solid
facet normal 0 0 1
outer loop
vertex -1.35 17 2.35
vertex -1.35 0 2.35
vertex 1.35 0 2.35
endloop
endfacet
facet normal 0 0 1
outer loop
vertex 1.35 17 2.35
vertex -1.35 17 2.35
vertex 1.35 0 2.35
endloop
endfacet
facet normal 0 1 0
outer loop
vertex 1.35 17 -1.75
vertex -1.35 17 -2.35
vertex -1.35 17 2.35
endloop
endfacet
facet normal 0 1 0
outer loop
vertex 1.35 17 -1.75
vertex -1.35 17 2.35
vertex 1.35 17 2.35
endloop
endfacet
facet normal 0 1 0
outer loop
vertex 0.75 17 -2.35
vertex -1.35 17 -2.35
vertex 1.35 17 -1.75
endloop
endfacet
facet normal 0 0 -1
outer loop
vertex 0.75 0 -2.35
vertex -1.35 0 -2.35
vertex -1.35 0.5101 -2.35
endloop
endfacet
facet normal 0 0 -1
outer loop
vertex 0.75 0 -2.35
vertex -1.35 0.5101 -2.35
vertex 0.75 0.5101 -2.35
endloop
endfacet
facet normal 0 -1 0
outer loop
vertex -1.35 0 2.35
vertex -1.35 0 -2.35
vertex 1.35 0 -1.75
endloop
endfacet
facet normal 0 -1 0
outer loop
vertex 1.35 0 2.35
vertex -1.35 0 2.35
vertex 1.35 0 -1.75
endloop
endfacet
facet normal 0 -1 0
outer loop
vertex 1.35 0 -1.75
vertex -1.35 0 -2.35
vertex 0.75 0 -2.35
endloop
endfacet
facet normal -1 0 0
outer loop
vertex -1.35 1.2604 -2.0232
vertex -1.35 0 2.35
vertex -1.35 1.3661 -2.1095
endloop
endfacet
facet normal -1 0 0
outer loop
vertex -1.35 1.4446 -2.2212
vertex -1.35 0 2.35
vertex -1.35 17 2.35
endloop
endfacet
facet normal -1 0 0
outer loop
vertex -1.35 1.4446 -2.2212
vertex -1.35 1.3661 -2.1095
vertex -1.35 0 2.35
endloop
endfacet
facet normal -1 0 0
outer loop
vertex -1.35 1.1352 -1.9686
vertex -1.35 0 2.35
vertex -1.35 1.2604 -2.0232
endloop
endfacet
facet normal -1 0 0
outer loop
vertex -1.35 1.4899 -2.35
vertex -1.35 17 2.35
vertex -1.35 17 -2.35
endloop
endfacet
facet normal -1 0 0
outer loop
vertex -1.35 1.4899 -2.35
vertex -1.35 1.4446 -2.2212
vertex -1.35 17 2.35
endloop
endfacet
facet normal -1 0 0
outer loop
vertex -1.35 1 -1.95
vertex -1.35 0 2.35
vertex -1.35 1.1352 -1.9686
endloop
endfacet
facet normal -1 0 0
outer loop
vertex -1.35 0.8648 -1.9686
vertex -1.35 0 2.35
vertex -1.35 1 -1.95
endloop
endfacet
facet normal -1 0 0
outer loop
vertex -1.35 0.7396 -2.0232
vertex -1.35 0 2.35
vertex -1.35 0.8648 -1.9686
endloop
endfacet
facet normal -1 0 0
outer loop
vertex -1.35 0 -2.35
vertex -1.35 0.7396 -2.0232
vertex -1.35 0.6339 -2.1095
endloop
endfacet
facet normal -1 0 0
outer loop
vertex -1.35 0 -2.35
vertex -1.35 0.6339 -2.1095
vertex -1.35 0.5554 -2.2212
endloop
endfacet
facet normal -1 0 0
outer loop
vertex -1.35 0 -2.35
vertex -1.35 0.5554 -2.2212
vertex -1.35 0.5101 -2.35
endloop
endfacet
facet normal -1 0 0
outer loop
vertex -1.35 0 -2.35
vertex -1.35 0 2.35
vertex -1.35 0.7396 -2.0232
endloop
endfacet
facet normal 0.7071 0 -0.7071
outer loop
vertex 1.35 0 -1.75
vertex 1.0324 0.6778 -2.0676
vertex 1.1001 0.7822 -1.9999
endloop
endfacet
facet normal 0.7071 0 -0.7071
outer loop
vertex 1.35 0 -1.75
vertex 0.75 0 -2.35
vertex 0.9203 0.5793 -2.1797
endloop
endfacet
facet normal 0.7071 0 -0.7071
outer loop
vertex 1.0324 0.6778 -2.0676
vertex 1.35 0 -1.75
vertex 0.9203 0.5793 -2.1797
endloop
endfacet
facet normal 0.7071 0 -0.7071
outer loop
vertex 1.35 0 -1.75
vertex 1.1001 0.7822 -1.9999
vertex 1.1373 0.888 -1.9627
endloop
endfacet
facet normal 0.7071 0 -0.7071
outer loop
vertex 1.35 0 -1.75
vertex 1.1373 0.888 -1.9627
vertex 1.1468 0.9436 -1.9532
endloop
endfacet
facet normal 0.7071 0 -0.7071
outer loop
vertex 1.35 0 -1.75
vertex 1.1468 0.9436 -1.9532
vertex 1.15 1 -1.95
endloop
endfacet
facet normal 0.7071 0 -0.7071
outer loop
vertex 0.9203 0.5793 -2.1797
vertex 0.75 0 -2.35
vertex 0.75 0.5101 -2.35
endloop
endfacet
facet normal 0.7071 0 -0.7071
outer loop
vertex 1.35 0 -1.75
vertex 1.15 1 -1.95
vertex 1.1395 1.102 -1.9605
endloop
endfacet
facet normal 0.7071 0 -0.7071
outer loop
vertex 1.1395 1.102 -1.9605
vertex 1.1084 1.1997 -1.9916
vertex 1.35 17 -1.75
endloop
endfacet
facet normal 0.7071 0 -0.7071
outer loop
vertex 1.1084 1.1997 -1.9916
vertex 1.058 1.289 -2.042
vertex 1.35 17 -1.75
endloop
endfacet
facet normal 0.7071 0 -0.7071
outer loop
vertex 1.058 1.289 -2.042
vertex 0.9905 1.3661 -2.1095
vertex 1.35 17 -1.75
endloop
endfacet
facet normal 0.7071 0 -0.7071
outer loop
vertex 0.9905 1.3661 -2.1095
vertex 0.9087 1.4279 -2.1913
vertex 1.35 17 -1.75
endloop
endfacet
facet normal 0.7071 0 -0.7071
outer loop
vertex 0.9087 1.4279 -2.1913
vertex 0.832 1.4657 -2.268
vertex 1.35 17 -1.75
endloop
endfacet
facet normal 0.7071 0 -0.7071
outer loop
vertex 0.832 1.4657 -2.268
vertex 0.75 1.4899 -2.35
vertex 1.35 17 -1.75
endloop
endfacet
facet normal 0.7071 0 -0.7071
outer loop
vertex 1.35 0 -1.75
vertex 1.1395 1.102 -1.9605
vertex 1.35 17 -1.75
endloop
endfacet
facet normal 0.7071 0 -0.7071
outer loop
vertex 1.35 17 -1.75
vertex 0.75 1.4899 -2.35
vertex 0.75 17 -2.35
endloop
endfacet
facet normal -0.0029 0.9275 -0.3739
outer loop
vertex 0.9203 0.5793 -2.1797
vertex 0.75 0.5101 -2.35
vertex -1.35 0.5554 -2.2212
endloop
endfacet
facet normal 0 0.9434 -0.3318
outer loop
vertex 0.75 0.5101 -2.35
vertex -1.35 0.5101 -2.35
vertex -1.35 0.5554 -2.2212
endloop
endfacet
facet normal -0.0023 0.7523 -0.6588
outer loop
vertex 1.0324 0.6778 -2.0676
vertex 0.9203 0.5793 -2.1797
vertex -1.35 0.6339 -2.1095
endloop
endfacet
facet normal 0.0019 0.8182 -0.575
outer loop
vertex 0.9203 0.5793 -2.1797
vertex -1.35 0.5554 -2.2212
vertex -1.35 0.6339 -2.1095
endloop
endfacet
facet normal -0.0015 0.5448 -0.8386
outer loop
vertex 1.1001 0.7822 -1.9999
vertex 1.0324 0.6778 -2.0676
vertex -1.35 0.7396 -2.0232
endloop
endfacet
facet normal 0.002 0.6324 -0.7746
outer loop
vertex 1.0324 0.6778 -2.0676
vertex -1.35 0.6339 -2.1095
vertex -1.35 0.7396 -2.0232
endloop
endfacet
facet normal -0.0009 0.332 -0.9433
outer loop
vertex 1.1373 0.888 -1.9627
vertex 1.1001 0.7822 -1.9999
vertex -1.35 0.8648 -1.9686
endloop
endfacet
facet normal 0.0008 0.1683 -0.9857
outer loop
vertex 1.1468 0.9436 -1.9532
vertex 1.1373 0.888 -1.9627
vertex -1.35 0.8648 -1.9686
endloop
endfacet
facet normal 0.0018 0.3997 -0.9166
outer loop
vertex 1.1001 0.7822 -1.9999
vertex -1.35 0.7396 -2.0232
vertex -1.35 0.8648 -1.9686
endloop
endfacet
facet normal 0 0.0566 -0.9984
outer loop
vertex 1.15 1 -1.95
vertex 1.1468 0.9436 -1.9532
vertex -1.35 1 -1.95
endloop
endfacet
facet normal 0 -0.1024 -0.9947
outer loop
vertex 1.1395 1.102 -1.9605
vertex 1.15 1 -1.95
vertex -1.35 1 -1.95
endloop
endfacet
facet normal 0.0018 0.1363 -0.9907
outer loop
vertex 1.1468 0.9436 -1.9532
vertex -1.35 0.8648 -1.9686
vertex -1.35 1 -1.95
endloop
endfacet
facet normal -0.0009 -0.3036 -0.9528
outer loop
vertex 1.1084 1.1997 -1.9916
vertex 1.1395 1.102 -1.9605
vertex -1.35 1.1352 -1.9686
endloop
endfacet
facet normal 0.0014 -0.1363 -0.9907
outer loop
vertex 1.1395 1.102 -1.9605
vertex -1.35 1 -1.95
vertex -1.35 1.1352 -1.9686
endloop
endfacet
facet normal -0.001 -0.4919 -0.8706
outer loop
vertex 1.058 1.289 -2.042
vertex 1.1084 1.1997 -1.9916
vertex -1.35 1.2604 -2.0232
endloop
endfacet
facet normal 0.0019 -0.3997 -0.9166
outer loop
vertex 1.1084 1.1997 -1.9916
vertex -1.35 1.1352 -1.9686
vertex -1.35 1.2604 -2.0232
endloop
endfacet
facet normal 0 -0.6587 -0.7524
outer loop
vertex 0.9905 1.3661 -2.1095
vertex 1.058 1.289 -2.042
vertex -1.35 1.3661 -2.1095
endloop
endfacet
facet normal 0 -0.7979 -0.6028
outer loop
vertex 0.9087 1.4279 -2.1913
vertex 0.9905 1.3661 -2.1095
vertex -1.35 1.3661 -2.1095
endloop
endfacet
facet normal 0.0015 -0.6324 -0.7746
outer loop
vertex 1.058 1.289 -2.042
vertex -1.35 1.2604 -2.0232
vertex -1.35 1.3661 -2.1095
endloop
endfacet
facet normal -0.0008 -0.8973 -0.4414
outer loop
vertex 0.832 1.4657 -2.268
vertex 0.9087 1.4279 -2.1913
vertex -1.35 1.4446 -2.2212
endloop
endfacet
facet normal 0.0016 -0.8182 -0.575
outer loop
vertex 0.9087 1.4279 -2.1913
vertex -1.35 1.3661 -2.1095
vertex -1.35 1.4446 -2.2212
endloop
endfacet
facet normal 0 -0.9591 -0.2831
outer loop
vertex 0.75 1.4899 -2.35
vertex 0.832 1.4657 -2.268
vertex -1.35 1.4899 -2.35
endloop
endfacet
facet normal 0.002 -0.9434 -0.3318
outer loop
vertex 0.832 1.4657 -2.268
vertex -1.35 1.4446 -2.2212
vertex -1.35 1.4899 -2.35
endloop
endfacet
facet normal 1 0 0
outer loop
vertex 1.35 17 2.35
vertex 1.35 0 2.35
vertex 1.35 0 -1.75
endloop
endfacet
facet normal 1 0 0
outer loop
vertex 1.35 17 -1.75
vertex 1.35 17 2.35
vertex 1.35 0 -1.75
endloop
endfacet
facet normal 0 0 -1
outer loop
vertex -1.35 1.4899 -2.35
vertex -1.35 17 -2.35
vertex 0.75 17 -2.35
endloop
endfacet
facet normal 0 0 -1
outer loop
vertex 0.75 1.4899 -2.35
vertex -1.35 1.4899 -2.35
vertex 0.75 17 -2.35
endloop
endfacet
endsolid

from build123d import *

# Parameters (mm, degrees)
SKETCH_1_W          = 2.7
SKETCH_1_H          = 4.7
EXTRUDE_1_DEPTH     = 17
CHAMFER_1_SIZE      = 0.6
CUT_EXTRUDE_2_REACH = 19.373
SKETCH_3_R          = 0.5


with BuildPart() as part:
    # 草圖1 → 伸長1 (new body)
    with BuildSketch(Plane(origin=(0, 0, 0), x_dir=(1, 0, 0), z_dir=(0, 1, 0))):
        Rectangle(SKETCH_1_W, SKETCH_1_H)
    extrude(amount=EXTRUDE_1_DEPTH)

    # 導角1
    chamfer_1_edges = [part.edges().sort_by_distance(p)[0] for p in [
        (1.35, 8.5, -2.35),
    ]]
    chamfer(chamfer_1_edges, length=CHAMFER_1_SIZE)

    # 伸長2: up to this plane
    cut_extrude_2_end = Plane(origin=(0.75, 17, -2.35), z_dir=(-0.7071067811865486, 0, 0.7071067811865466))
    # 草圖3 → 伸長2 (cut, up to the surface)
    with BuildSketch(Plane.ZY.offset(1.35), mode=Mode.PRIVATE) as cut_extrude_2_sk1:
        with Locations((-2.45, 1)):
            Circle(SKETCH_3_R)
    cut_extrude_2_tool1 = split(extrude(cut_extrude_2_sk1.sketch, amount=-CUT_EXTRUDE_2_REACH, mode=Mode.PRIVATE), bisect_by=cut_extrude_2_end, keep=Keep.BOTH, mode=Mode.PRIVATE)
    add(cut_extrude_2_tool1.solids().sort_by_distance((-1.35, 1, -2.45))[0], mode=Mode.SUBTRACT)


solid = part.part
